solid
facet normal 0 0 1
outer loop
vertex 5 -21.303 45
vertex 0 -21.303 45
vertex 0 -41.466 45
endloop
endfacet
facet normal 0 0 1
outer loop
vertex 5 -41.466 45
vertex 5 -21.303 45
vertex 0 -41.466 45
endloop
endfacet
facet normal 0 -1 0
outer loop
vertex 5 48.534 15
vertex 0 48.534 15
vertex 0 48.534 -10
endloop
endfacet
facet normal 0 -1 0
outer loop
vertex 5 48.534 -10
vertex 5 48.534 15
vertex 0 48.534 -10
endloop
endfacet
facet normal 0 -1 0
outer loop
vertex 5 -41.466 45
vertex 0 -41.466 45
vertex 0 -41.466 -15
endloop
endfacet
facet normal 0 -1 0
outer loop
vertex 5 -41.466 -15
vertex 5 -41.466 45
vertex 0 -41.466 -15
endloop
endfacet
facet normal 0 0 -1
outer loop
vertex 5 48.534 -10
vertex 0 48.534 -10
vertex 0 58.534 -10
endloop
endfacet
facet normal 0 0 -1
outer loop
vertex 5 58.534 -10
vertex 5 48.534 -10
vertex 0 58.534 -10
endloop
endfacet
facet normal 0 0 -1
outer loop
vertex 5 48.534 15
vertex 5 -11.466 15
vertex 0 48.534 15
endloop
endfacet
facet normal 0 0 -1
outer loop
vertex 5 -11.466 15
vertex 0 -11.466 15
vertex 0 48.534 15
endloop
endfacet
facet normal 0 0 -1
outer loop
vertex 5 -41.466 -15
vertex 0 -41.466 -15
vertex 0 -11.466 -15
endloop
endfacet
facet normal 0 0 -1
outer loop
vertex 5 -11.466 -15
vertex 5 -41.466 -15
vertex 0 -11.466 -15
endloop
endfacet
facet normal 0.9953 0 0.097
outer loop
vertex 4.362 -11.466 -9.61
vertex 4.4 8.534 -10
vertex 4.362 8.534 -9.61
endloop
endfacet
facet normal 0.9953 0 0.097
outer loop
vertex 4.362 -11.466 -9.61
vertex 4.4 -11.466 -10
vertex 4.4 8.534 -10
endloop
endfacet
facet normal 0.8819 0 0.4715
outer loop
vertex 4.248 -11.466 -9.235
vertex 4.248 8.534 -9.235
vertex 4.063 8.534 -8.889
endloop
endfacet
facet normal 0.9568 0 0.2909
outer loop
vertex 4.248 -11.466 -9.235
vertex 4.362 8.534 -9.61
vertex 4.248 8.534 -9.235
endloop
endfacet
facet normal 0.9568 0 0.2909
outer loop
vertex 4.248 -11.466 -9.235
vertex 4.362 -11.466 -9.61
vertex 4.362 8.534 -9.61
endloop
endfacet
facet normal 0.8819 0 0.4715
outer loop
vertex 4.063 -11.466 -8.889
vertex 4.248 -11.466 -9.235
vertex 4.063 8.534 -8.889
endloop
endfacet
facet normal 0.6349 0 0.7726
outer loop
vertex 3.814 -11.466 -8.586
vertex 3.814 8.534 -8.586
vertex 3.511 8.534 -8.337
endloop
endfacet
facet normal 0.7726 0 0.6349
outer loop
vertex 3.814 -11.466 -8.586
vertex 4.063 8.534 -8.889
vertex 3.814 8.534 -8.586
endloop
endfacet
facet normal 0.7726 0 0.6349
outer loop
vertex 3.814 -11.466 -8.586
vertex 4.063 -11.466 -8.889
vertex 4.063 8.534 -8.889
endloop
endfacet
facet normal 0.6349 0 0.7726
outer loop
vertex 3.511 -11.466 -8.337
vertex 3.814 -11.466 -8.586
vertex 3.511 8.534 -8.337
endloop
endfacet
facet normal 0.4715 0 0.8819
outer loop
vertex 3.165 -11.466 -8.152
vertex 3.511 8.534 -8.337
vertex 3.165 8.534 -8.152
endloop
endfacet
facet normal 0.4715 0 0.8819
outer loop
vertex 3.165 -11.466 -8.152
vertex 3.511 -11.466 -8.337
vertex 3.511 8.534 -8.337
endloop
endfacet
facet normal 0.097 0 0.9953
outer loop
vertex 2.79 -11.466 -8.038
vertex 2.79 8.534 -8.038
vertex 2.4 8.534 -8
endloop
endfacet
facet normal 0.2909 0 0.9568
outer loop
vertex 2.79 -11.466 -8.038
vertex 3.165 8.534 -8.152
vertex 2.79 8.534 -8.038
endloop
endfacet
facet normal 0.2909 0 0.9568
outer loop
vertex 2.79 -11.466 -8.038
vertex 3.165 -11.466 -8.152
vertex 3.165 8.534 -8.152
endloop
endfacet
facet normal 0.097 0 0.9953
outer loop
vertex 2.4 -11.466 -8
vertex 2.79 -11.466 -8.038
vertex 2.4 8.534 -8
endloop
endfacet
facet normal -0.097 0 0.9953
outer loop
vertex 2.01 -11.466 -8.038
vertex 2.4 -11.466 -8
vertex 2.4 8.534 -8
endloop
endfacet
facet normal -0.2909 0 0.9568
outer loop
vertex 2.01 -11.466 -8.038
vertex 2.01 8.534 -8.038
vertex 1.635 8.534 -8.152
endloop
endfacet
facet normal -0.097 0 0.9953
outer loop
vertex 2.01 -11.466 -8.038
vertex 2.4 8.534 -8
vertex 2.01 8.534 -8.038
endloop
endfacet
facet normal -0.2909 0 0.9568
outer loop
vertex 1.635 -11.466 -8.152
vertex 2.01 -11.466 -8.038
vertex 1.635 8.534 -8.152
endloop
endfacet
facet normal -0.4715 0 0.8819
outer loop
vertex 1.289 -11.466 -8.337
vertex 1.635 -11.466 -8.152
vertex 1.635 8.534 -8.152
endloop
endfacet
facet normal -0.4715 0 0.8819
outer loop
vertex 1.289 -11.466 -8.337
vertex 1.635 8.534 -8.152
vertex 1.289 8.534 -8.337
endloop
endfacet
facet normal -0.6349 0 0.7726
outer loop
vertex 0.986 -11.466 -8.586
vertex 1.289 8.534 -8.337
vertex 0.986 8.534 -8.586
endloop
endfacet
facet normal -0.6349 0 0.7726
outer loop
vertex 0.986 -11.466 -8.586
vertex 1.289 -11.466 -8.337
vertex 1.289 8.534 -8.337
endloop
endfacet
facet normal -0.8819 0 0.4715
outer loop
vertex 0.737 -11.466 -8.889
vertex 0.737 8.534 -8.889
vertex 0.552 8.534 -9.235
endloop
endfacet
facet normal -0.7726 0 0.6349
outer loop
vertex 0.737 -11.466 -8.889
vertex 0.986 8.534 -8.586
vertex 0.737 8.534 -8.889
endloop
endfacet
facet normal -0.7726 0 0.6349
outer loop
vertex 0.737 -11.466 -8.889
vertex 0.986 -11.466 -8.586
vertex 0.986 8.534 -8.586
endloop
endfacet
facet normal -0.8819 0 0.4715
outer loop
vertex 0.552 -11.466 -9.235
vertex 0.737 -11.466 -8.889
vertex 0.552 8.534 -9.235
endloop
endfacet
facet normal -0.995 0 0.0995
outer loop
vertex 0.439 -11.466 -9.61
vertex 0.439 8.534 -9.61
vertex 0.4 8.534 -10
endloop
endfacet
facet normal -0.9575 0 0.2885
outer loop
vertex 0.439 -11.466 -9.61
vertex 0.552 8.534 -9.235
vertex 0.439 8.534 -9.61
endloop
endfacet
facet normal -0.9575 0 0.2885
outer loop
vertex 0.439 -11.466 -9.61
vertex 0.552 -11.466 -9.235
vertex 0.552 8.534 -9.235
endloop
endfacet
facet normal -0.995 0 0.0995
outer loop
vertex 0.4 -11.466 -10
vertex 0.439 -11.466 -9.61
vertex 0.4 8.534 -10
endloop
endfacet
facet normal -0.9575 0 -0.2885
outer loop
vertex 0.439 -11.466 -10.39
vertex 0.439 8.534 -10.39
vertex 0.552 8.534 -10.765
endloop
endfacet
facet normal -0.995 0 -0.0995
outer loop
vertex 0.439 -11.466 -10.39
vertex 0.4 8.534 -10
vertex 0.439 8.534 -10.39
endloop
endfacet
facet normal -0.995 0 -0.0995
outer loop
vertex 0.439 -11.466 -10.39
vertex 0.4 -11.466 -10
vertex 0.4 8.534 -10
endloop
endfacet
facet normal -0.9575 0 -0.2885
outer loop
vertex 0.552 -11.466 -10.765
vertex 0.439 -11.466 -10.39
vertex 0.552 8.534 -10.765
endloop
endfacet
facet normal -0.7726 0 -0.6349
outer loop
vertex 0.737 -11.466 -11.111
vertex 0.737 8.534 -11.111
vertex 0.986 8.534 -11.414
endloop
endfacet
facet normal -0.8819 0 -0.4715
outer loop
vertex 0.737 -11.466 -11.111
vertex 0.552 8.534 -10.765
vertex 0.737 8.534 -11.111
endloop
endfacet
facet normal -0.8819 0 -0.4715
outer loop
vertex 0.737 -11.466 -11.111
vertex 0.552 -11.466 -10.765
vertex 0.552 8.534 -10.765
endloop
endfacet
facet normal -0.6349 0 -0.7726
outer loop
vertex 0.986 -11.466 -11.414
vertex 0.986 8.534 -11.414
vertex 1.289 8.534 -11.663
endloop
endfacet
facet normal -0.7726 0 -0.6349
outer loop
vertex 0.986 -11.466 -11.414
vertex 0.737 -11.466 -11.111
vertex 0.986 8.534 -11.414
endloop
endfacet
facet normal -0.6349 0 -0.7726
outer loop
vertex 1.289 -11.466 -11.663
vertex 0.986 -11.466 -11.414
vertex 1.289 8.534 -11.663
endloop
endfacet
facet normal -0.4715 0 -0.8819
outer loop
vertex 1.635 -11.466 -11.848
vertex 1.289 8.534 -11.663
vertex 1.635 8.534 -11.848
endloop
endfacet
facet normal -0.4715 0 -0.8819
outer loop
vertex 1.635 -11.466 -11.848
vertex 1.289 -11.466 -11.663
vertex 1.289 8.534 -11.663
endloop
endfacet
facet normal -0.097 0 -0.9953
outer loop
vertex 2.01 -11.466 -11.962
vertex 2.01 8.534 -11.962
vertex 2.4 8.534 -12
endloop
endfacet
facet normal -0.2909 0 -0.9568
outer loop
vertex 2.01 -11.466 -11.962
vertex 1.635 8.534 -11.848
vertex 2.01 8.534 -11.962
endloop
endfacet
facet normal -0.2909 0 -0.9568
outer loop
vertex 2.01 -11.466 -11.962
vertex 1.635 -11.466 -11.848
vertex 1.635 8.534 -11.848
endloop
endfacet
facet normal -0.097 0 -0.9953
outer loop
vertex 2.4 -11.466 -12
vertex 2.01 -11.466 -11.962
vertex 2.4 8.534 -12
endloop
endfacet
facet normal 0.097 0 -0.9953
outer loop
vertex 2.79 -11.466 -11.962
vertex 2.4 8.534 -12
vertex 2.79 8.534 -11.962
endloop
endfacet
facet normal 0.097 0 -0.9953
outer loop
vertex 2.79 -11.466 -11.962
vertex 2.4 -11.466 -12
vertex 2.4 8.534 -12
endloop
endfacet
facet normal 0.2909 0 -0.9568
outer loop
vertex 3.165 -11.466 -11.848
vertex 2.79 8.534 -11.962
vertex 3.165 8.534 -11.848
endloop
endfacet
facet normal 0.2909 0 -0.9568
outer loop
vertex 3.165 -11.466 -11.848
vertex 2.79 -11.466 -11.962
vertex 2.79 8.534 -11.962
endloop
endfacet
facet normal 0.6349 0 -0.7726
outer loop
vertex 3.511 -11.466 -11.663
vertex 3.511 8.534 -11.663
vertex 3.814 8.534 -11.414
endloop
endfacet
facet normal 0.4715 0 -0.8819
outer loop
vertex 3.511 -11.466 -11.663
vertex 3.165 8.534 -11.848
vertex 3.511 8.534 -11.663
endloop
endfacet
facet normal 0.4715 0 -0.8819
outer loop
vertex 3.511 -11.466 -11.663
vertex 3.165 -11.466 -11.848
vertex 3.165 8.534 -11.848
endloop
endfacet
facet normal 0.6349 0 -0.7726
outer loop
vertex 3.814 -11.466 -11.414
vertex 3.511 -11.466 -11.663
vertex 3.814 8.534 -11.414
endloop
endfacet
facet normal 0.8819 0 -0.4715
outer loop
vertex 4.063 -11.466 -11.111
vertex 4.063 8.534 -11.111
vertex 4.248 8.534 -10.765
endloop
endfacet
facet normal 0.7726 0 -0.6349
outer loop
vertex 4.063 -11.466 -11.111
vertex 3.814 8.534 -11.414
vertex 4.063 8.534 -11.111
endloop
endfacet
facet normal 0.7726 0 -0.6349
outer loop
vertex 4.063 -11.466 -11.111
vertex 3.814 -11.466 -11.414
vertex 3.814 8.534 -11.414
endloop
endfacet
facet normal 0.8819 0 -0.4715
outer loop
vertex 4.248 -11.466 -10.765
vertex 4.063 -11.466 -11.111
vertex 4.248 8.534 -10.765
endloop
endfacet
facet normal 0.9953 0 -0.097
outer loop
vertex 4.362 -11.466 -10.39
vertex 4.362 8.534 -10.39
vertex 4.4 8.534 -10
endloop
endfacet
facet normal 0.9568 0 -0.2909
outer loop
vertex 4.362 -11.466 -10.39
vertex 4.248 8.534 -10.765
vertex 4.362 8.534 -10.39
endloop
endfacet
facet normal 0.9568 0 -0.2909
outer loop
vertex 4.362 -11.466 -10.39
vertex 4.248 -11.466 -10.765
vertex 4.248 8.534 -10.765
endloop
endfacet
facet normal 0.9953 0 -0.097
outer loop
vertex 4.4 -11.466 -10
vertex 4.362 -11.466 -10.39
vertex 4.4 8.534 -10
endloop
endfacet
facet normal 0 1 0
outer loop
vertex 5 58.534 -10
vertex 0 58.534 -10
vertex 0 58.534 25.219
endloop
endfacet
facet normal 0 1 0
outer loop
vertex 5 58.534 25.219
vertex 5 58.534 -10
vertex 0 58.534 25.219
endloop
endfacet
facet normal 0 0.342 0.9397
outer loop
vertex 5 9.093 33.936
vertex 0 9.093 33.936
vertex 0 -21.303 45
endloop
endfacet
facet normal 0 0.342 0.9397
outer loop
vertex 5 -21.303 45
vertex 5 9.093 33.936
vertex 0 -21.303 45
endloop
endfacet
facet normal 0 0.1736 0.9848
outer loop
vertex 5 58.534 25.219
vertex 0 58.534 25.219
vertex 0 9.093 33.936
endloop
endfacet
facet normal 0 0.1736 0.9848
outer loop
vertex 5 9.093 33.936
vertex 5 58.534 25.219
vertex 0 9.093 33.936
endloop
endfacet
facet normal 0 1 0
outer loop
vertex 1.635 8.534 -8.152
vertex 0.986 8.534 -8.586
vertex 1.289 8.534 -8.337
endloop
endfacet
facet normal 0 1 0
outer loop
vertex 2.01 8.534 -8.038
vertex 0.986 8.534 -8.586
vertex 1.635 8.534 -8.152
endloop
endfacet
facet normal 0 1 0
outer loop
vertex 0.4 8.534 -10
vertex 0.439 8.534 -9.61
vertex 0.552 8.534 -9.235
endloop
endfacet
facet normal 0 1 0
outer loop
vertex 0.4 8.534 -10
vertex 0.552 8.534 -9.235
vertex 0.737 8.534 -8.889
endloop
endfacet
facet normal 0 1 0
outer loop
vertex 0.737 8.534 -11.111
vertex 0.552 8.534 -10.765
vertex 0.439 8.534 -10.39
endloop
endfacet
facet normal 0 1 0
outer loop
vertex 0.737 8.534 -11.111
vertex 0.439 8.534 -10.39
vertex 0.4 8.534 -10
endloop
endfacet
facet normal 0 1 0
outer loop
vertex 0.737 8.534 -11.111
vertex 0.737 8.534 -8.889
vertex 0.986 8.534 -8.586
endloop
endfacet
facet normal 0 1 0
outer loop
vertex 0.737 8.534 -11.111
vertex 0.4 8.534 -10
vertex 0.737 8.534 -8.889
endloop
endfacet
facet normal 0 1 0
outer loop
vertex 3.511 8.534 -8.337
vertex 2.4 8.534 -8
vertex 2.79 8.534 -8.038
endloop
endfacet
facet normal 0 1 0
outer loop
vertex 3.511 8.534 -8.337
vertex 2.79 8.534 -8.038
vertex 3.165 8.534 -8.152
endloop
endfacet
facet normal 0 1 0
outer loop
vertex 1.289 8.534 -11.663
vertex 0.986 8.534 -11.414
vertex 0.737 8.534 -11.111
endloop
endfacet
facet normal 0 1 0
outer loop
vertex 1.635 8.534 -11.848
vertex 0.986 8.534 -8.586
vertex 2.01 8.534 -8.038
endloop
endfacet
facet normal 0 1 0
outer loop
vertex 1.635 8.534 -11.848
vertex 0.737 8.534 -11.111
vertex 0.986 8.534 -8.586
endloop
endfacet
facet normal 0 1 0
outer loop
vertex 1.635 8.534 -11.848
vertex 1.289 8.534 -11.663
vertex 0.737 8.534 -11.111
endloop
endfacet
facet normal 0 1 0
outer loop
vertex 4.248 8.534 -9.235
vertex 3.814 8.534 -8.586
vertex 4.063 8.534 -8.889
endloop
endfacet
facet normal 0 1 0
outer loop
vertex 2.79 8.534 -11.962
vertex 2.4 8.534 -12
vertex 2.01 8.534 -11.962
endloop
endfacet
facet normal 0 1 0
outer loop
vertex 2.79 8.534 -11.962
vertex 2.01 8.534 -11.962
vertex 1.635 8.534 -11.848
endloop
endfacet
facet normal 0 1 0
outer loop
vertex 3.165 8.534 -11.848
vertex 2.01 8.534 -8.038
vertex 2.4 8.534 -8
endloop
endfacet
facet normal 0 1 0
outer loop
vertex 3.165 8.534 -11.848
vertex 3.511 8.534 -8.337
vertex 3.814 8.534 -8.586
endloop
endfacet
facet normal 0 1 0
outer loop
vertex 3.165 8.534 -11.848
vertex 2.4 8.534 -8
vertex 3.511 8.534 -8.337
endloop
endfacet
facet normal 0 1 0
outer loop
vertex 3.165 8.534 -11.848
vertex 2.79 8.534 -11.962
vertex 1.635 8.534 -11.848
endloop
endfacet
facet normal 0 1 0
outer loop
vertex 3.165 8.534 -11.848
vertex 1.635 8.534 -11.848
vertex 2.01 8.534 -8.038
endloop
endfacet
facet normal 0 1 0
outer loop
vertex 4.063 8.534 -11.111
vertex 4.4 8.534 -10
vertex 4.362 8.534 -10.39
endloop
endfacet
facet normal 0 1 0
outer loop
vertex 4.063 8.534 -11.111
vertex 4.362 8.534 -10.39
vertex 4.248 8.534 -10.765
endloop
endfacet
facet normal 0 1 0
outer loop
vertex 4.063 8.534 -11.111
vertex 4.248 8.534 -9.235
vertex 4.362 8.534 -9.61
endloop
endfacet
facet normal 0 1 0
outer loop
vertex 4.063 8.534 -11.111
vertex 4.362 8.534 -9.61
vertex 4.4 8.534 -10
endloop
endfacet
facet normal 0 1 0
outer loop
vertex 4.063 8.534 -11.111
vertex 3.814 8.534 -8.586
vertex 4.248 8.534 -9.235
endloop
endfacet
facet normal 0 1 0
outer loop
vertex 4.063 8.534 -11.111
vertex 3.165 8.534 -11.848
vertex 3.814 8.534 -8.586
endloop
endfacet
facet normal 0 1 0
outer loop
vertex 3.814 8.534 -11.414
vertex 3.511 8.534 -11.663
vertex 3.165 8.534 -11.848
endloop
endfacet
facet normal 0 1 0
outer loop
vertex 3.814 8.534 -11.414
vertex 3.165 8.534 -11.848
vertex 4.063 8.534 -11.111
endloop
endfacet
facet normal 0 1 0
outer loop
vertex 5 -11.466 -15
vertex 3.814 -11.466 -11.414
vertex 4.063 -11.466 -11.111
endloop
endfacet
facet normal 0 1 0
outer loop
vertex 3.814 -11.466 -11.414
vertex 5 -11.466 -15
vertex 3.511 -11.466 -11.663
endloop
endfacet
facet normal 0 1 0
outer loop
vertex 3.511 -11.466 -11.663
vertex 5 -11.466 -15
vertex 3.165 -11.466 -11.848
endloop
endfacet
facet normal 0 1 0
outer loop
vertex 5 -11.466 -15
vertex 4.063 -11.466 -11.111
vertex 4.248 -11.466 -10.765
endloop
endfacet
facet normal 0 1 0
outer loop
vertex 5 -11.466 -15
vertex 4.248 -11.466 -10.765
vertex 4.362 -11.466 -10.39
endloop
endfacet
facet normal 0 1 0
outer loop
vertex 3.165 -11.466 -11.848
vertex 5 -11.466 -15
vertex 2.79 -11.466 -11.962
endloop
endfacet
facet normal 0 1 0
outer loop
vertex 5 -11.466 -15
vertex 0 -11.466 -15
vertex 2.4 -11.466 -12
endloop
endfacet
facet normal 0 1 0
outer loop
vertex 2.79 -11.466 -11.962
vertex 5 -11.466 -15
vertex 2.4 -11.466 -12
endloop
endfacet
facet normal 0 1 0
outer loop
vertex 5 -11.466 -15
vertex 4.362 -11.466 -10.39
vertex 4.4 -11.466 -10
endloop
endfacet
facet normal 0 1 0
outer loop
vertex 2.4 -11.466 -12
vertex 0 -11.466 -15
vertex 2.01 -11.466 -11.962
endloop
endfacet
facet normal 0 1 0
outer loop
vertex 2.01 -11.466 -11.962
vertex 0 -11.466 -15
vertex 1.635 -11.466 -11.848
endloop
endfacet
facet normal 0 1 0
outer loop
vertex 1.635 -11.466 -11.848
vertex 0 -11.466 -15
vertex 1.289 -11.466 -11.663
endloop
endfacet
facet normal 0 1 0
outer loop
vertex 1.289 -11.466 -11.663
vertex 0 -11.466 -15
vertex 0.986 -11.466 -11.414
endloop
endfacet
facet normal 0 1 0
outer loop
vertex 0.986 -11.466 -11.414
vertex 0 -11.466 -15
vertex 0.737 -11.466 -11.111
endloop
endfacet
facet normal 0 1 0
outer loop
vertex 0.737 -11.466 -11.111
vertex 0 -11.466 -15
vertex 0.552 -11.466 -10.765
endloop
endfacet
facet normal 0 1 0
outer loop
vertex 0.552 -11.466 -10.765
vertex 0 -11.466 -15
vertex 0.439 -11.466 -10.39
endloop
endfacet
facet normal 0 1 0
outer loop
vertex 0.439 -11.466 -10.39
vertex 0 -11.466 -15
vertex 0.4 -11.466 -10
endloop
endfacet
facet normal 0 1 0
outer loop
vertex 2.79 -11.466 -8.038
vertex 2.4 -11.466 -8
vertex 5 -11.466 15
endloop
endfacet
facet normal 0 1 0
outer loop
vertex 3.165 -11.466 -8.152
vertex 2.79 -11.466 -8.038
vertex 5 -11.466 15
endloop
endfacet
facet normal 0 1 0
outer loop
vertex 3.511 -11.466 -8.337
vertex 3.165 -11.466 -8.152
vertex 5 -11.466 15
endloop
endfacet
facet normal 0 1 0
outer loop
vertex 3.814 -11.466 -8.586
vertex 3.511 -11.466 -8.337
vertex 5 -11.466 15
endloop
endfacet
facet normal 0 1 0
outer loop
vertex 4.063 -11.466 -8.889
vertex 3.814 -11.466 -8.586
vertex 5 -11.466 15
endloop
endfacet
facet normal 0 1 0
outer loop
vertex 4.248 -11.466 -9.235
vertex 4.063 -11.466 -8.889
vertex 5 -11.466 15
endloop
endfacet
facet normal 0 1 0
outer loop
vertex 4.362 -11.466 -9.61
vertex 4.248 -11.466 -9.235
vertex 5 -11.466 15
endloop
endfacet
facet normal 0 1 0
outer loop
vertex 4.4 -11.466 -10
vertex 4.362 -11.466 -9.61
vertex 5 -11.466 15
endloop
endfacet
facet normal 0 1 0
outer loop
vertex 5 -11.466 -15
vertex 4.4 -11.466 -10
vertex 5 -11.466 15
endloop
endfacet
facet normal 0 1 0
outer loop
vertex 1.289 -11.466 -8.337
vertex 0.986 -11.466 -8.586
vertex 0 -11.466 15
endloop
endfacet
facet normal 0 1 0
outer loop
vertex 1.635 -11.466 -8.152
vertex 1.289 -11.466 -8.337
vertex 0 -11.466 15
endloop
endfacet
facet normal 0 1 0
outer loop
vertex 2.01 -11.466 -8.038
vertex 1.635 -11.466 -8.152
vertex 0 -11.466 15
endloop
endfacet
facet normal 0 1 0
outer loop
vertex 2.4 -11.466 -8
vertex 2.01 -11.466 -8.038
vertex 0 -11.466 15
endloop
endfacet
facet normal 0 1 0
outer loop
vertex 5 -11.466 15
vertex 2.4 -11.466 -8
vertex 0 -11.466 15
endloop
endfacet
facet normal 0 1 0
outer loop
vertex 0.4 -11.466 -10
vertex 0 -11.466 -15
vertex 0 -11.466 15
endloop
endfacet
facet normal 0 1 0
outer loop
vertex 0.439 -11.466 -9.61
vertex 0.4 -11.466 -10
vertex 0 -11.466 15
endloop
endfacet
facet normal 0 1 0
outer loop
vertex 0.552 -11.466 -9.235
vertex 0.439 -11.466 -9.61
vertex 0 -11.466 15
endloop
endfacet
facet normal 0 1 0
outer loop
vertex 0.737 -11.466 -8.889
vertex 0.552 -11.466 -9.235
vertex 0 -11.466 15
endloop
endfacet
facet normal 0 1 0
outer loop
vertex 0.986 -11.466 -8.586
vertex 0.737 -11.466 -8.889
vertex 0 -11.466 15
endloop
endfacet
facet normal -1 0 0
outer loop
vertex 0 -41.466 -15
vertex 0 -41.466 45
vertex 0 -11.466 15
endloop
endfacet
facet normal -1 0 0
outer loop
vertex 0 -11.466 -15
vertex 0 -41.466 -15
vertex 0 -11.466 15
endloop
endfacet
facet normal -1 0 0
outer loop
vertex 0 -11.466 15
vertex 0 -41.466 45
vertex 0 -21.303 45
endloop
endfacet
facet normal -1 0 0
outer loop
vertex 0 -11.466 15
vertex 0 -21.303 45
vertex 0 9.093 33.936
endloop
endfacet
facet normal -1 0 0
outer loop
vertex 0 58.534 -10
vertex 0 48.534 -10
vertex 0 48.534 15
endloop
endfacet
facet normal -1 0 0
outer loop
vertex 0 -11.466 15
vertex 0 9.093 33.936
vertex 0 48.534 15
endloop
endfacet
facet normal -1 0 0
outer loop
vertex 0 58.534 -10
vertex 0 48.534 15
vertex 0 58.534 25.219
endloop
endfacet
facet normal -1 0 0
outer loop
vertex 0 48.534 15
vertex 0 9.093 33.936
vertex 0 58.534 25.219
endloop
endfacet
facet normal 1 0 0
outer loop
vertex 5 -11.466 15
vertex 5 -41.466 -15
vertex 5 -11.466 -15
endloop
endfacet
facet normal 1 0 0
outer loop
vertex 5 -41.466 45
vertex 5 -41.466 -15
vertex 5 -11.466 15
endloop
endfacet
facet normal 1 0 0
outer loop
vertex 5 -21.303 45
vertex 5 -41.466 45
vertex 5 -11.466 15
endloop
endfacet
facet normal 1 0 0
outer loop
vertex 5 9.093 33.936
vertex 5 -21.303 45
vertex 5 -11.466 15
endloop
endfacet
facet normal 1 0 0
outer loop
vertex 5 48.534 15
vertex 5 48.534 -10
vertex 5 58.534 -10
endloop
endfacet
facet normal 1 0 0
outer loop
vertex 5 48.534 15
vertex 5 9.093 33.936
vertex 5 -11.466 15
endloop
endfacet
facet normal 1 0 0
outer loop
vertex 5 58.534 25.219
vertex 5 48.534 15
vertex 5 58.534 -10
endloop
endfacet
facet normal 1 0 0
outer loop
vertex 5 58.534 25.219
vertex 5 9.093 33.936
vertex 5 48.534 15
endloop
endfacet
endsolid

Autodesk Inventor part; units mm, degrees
ref_plane "YZ Plane" through (0, 0, 0) normal (1, 0, 0) x (0, 1, 0)
ref_plane "XZ Plane" through (0, 0, 0) normal (0, 1, 0) x (-1, 0, 0)
ref_plane "XY Plane" through (0, 0, 0) normal (0, 0, 1) x (1, 0, 0)
sketch "Sketch1" plane through (0, 0, 0) normal (1, 0, 0) x (0, 1, 0)
  line L0 (-21.3033, 45) -> (-41.466, 45)
  line L1 (-41.466, 45) -> (-41.466, -15)
  line L2 (-41.466, -15) -> (-11.466, -15)
  line L3 (-11.466, -15) -> (-11.466, 15)
  line L4 (-11.466, 15) -> (48.534, 15)
  line L5 (48.534, 15) -> (48.534, -10)
  line L6 (48.534, -10) -> (58.534, -10)
  line L7 (58.534, -10) -> (58.534, 25.2188)
  line L8 (58.534, 25.2188) -> (9.0933, 33.9365)
  line L9 (9.0933, 33.9365) -> (-21.3033, 45)
  point P0 (0, 0)
  dimension "d0" = 60
  dimension "d1" = 30
  dimension "d2" = 30
  dimension "d3" = 60
  dimension "d4" = 10
  dimension "d5" = 100
  dimension "d7" = 25
  dimension "d8" = 160
  dimension "d9" = 58.534
  dimension "d10" = 10
  dimension "d11" = 35
  dimension "d12" = 35
extrude "Extrusion1" add sketch "Sketch1" along normal blind 5
sketch "Sketch2" plane through (0, -11.466, 15) normal (0, 1, 0) x (1, 0, 0)
  circle A0 centre (2.4001, 25) radius 2
  line L0 (0, 30) -> (0, 0) projected
  line L1 (0, 0) -> (5, 0) projected
  line L2 (5, 30) -> (5, 0) projected
  line L3 (0, 30) -> (5, 30) projected
  point P0 (0, 15)
  dimension "d15" = 4
  dimension "d16" = 25
extrude "Extrusion2" add sketch "Sketch2" along normal blind 20 contours A0
properties part number "Pala1"
